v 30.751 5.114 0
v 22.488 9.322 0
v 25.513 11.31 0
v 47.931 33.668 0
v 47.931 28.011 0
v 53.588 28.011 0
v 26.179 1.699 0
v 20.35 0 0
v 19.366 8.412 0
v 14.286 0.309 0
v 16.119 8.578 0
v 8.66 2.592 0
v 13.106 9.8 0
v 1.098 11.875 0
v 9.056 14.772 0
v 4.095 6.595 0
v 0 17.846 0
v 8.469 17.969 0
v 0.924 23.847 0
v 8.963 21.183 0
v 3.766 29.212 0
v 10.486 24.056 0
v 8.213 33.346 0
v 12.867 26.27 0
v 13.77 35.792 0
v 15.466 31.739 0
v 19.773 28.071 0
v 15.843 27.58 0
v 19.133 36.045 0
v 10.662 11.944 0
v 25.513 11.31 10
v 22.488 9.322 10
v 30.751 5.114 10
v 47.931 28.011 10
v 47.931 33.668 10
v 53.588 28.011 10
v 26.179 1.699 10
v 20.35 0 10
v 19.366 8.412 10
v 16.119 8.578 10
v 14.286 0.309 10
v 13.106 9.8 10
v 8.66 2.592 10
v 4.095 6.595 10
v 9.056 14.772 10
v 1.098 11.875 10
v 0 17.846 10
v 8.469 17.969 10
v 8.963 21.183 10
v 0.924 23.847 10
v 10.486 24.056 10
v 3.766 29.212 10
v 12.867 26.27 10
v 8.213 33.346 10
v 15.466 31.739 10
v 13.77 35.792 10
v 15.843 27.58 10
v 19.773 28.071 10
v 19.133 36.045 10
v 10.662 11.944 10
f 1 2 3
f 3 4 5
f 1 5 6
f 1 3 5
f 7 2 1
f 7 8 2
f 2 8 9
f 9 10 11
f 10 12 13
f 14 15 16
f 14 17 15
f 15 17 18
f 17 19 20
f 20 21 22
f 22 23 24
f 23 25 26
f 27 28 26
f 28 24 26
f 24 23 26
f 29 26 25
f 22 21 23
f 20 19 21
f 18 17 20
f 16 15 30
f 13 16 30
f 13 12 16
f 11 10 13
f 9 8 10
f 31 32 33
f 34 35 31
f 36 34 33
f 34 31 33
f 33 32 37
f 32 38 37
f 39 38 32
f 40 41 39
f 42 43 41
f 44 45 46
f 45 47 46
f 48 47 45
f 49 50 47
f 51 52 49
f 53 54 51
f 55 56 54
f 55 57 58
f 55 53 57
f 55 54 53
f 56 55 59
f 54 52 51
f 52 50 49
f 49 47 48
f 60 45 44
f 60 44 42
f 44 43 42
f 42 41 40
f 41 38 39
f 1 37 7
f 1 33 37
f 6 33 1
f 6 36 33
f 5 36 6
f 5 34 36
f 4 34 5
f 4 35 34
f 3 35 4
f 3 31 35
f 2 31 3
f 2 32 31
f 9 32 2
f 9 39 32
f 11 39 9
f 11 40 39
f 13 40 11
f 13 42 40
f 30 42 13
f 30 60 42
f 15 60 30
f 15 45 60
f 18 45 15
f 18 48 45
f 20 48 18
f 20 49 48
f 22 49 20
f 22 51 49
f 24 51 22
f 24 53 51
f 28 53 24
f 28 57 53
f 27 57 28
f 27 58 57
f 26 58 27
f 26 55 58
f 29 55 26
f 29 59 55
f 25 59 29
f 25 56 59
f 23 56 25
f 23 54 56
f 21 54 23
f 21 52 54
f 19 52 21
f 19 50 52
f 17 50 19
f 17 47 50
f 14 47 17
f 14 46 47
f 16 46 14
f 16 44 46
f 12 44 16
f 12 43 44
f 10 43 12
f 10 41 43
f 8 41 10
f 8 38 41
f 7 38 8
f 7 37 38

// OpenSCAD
$fn = 32;

// ----------------------------------------------------------------------
// Eye lug: ring_tail, 10 mm thick
// ----------------------------------------------------------------------

// --- parameters (mm) ---
profile_height = 10;      // extrusion height
profile_points = 30;      // points of the closed outline

profile = [[15.466, 31.739], [19.133, 36.045], [13.77, 35.792], [8.213, 33.346], [3.766, 29.212], [0.924, 23.847], [0, 17.846], [1.098, 11.875], [4.095, 6.595], [8.66, 2.592], [14.286, 0.309], [20.35, 0], [26.179, 1.699], [30.751, 5.114], [53.588, 28.011], [47.931, 28.011], [47.931, 33.668], [25.513, 11.31], [22.488, 9.322], [19.366, 8.412], [16.119, 8.578], [13.106, 9.8], [10.662, 11.944], [9.056, 14.772], [8.469, 17.969], [8.963, 21.183], [10.486, 24.056], [12.867, 26.27], [15.843, 27.58], [19.773, 28.071]];  // single closed polygon, 30 points, counter clockwise

// --- the one profile operation ---
linear_extrude(height = profile_height) polygon(points = profile);
